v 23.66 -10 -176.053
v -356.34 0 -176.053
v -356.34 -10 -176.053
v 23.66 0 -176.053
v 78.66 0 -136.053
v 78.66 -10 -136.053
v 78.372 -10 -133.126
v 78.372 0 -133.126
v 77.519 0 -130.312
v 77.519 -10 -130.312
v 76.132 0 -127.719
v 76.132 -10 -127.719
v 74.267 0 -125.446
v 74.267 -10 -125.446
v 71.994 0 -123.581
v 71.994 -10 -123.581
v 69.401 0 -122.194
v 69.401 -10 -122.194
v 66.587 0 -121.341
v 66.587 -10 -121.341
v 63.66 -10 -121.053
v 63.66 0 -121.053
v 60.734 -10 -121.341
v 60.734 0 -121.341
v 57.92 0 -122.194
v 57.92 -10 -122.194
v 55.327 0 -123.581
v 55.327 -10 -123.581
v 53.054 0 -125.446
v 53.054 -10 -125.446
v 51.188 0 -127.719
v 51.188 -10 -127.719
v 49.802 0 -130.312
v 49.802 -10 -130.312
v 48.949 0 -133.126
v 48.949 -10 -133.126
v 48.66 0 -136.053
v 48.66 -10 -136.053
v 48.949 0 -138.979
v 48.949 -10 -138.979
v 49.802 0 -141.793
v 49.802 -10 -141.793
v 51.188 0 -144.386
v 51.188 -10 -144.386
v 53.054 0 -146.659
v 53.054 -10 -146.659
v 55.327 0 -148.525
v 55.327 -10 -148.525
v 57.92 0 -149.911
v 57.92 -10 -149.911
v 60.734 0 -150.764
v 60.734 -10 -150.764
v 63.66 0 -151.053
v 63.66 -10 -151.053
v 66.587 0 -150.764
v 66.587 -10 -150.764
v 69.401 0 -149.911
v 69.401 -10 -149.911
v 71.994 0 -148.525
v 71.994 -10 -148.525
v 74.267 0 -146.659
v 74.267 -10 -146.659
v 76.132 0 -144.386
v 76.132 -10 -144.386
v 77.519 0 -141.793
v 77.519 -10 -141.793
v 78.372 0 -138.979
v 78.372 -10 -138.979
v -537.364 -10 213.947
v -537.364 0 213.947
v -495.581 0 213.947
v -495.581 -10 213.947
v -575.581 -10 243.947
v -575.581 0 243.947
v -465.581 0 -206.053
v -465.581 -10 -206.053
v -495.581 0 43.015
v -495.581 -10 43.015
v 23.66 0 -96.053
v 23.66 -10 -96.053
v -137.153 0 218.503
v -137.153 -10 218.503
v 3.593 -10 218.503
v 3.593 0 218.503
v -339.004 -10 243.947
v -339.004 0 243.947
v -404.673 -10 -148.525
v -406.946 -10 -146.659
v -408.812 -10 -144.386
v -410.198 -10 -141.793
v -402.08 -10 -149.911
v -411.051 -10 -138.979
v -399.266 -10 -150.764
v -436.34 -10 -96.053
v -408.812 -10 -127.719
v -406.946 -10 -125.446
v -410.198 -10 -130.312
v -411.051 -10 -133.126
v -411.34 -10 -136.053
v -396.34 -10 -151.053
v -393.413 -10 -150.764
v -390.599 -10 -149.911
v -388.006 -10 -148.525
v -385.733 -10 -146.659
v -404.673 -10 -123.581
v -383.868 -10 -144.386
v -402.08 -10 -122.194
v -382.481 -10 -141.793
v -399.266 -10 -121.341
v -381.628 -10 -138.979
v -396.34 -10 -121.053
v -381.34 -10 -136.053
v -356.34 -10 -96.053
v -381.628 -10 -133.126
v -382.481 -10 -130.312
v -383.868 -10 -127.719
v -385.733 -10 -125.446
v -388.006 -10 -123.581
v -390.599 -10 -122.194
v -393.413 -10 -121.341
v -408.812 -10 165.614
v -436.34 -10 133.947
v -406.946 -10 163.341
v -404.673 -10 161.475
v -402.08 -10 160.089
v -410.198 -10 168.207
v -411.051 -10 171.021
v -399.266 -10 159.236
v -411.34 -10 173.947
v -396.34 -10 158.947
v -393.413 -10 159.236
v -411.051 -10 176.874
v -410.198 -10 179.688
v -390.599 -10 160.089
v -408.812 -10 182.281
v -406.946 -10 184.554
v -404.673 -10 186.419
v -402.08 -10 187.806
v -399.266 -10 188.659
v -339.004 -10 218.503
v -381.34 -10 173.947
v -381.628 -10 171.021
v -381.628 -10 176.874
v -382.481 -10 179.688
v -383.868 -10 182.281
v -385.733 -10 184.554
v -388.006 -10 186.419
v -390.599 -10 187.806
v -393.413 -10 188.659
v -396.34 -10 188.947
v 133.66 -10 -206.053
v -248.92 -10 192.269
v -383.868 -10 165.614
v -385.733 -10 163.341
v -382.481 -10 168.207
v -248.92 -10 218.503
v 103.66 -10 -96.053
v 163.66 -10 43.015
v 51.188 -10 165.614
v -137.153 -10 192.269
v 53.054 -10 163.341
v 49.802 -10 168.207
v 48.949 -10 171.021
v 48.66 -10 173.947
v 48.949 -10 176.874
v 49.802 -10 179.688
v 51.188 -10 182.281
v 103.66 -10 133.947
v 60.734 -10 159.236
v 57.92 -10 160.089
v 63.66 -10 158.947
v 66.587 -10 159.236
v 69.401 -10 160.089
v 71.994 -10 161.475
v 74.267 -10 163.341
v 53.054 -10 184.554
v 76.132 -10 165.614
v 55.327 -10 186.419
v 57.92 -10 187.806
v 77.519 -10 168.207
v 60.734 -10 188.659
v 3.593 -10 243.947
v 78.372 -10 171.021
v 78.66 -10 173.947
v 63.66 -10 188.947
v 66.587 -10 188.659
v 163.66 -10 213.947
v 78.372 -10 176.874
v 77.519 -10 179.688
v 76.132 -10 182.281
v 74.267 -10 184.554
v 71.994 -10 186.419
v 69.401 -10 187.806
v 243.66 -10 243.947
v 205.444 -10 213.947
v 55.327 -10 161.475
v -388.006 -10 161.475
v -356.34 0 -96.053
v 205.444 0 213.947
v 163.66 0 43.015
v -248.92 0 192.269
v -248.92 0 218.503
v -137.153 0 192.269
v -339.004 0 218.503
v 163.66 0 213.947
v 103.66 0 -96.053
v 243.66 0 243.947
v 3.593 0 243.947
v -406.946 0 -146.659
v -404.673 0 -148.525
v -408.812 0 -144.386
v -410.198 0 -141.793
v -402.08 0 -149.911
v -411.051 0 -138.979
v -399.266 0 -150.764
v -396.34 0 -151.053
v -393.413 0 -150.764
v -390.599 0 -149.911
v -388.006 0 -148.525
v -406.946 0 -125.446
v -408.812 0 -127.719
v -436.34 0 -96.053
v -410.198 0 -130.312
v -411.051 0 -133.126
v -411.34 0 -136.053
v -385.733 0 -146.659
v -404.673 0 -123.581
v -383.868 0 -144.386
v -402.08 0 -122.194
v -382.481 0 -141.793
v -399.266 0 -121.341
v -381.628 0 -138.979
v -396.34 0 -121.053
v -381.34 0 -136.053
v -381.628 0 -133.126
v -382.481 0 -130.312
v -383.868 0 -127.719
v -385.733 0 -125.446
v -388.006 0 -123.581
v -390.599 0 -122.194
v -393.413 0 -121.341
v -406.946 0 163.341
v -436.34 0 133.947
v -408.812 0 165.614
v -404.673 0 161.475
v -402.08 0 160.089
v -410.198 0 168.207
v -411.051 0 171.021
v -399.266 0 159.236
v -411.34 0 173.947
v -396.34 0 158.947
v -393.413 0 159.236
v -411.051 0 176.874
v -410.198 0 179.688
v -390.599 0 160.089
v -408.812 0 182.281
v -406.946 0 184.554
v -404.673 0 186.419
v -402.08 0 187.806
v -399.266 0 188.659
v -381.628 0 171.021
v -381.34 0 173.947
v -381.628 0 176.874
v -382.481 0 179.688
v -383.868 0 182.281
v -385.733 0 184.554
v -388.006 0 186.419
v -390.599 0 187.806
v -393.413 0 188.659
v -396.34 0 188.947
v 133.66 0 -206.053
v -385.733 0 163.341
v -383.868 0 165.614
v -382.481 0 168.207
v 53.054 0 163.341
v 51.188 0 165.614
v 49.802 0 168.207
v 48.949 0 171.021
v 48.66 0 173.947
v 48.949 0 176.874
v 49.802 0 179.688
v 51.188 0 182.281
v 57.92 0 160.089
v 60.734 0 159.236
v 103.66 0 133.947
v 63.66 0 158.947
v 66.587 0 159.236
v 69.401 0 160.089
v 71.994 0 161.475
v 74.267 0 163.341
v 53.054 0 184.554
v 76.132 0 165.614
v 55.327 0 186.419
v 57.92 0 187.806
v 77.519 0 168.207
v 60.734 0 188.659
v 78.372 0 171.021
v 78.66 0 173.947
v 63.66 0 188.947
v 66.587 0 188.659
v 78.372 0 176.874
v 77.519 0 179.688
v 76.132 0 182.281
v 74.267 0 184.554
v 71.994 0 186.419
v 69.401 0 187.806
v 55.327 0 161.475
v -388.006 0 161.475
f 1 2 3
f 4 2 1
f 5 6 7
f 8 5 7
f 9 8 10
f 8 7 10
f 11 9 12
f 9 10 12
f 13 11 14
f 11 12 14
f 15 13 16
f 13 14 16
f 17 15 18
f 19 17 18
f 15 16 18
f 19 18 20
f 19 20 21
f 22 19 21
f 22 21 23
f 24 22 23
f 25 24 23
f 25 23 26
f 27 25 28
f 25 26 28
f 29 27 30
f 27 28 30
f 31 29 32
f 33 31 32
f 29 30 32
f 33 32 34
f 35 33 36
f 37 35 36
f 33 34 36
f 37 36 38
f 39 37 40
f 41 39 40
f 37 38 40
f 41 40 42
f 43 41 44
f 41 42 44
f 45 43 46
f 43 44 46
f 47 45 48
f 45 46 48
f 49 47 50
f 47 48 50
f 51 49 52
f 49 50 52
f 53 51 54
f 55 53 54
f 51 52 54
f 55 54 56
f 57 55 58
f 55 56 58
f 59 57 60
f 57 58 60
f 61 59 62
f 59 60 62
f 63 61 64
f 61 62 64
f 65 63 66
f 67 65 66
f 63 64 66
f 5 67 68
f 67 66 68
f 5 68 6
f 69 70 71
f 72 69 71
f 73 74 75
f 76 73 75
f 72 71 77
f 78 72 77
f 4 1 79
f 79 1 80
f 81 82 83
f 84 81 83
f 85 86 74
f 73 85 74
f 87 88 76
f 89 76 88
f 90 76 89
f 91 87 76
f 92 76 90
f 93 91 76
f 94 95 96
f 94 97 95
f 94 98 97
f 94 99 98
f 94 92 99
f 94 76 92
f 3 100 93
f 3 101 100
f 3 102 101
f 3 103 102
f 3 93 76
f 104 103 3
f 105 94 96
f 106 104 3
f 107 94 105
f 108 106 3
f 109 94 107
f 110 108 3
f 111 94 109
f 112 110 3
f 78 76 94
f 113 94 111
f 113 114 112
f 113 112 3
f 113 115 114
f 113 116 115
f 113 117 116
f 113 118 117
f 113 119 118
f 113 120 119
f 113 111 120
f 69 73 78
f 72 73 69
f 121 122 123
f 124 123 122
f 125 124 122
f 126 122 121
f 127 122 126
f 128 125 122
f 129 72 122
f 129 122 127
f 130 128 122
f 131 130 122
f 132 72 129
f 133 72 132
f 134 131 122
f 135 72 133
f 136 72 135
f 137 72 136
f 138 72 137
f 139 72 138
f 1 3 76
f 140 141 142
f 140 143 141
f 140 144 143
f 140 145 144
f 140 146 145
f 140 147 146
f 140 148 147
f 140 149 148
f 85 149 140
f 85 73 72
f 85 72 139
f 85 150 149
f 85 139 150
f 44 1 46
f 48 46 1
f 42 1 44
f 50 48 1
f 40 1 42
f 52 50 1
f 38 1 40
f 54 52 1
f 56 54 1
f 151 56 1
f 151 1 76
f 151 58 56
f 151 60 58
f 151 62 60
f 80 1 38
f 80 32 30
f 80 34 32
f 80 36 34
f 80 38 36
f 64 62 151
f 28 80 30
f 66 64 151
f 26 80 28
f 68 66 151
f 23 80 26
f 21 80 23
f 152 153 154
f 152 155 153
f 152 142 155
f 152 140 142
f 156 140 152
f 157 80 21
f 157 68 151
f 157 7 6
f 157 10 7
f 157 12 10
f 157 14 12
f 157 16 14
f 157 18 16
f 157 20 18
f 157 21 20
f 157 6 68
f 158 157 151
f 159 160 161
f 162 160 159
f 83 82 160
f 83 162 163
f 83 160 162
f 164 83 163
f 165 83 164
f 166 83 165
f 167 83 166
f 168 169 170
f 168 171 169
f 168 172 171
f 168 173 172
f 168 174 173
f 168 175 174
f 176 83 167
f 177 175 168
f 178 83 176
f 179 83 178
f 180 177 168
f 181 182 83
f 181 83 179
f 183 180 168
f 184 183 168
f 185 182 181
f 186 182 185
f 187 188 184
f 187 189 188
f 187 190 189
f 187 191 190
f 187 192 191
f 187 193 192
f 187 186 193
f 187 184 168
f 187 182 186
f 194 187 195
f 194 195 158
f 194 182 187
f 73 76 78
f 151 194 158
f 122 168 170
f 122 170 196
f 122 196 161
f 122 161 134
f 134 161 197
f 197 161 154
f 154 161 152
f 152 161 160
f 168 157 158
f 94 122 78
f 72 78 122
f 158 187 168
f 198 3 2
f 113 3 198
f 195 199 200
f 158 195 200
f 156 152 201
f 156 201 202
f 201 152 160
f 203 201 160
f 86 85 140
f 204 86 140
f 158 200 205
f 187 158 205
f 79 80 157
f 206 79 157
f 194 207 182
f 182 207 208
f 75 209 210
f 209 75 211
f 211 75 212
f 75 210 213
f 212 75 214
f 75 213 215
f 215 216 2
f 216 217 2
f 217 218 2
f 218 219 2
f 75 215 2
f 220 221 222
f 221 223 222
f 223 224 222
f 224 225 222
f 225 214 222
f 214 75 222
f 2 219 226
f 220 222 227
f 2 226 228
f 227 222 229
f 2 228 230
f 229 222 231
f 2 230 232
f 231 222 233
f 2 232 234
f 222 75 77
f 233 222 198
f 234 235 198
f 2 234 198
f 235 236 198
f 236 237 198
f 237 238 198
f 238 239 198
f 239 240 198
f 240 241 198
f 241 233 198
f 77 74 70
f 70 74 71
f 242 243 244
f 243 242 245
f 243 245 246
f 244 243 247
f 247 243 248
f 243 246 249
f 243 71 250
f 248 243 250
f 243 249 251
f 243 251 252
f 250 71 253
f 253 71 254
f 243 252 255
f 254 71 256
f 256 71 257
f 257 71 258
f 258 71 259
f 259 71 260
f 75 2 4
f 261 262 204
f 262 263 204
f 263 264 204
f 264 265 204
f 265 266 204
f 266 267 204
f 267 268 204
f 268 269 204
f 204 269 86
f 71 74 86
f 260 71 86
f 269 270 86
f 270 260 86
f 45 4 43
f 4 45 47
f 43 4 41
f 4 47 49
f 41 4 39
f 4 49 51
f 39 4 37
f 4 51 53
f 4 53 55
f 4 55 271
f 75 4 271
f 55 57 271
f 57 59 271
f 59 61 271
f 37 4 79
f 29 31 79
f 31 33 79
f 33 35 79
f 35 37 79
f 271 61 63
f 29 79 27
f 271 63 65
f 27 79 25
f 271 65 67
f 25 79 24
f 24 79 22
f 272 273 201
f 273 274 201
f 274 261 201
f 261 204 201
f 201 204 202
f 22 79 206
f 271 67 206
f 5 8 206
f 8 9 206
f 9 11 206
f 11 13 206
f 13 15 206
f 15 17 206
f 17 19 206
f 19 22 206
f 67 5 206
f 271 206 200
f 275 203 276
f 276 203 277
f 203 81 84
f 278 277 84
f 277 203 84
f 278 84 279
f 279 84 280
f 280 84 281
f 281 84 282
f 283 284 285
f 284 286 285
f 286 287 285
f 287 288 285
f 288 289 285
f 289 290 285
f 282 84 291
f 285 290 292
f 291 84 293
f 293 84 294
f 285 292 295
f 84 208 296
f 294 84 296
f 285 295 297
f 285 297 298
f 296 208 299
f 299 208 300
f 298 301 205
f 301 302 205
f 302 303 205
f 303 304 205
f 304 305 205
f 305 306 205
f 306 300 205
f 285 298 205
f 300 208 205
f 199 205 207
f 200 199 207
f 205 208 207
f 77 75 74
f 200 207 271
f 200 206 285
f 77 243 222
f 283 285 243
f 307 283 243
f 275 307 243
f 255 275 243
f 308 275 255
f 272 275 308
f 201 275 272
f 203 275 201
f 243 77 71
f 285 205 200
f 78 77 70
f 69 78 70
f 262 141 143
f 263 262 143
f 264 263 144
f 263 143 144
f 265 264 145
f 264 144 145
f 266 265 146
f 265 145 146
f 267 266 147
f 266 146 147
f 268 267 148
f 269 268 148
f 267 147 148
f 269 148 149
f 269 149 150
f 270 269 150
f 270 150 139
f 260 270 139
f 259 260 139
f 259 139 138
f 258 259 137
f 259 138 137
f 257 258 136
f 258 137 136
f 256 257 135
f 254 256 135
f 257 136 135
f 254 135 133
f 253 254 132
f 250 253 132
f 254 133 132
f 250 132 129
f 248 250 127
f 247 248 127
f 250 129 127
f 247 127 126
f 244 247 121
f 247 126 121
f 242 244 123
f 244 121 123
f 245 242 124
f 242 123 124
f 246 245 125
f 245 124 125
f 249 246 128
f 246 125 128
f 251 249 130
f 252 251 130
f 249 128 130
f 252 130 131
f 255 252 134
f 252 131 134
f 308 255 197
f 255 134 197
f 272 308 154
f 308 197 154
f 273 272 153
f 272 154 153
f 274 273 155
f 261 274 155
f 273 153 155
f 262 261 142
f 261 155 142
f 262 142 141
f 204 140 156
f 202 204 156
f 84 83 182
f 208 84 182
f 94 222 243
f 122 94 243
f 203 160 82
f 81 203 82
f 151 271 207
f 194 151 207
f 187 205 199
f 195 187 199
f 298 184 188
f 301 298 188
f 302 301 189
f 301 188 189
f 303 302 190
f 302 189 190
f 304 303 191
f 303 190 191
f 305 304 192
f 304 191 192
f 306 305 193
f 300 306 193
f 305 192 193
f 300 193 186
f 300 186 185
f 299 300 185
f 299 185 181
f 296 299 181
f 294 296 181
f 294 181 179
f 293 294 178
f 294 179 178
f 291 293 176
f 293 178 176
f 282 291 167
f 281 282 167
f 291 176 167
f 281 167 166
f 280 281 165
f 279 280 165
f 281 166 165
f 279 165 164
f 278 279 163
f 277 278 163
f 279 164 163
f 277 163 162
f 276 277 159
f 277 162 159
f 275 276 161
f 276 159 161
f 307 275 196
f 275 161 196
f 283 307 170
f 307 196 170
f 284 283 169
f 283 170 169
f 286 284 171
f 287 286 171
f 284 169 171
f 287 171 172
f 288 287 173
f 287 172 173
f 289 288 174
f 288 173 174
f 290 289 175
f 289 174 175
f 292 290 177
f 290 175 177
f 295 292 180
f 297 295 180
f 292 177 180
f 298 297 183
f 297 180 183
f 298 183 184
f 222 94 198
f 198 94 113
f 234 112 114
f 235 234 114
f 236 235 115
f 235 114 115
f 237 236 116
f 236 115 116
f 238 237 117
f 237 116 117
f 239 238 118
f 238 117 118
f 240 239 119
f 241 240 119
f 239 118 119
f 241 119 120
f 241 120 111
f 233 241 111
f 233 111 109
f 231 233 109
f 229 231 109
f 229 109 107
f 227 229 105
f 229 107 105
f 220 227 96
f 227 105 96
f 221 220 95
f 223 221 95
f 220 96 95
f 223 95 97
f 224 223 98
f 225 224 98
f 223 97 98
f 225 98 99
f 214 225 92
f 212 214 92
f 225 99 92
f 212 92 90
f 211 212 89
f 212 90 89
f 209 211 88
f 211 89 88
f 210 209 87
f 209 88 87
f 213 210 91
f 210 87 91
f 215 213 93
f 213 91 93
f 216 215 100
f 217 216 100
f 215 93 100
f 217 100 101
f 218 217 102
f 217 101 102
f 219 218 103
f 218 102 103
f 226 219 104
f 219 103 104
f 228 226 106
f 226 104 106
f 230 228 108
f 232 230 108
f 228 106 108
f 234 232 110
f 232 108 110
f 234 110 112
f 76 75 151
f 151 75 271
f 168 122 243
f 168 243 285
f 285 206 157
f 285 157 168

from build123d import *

# Parameters (mm, degrees)
F0_W     = 540
F0_H     = 390
F1_DEPTH = 10
F2_W     = 80
F2_H     = 80
F2_R     = 15
F3_DEPTH = 10
F5_W     = 380
F5_H     = 80
F6_DEPTH = 10
F7_DEPTH = 25
F8_W     = 111.767
F8_H     = 26.2346411405
F9_DEPTH = 25


with BuildPart() as f1:
    # F0 (on Front) → F1 (new body)
    with BuildSketch(Plane.XZ):
        Polygon((-575.5810141563, 243.9473703504), (-465.5810141563, -206.0526296496), (133.660423523, -206.0526296496), (243.660423523, 243.9473703504), (133.660423523, 243.9473703504), (-465.5810141563, 243.9473703504), align=None)
        with Locations((-166.339576477, 18.9473703504)):
            Rectangle(F0_W, F0_H, mode=Mode.SUBTRACT)
        Polygon((-495.5810141563, 43.0153865893), (-537.3643879646, 213.9473703504), (-495.5810141563, 213.9473703504), align=None, mode=Mode.SUBTRACT)
        Polygon((163.660423523, 213.9473703504), (205.4437973313, 213.9473703504), (163.660423523, 43.0153865893), align=None, mode=Mode.SUBTRACT)
    extrude(amount=F1_DEPTH)

    # F2 (on face) → F3 (join)
    with BuildSketch(Plane.XZ.offset(10)):
        with Locations((-396.339576477, 173.9473703504)):
            Rectangle(F2_W, F2_H)
        with Locations((-396.339576477, 173.9473703504)):
            Circle(F2_R, mode=Mode.SUBTRACT)
        with Locations((63.660423523, 173.9473703504)):
            Rectangle(F2_W, F2_H)
        with Locations((63.660423523, 173.9473703504)):
            Circle(F2_R, mode=Mode.SUBTRACT)
        with Locations((63.660423523, -136.0526296496)):
            Rectangle(F2_W, F2_H)
        with Locations((63.660423523, -136.0526296496)):
            Circle(F2_R, mode=Mode.SUBTRACT)
        with Locations((-396.339576477, -136.0526296496)):
            Rectangle(F2_W, F2_H)
        with Locations((-396.339576477, -136.0526296496)):
            Circle(F2_R, mode=Mode.SUBTRACT)
    extrude(amount=-F3_DEPTH)

    # F5 (on face) → F6 (join)
    with BuildSketch(Plane.XZ.offset(10)):
        with Locations((-166.339576477, 173.9473703504)):
            Rectangle(F5_W, F5_H)
    extrude(amount=-F6_DEPTH)

    # F4 (on face) → F7 (cut)
    with BuildSketch(Plane.XZ.offset(10)):
        Polygon((3.5932296524, 243.9473703504), (-339.0040903476, 243.9473703504), (-339.0040903476, 218.5033703504), (-286.9719266891, 218.5033703504), (3.5932296524, 218.5033703504), align=None)
    extrude(amount=-F7_DEPTH, mode=Mode.SUBTRACT)

    # F8 (on face) → F9 (cut)
    with BuildSketch(Plane.XZ.offset(10)):
        with Locations((-193.0365383425, 205.3860497801)):
            Rectangle(F8_W, F8_H)
    extrude(amount=-F9_DEPTH, mode=Mode.SUBTRACT)


solid = f1.part
